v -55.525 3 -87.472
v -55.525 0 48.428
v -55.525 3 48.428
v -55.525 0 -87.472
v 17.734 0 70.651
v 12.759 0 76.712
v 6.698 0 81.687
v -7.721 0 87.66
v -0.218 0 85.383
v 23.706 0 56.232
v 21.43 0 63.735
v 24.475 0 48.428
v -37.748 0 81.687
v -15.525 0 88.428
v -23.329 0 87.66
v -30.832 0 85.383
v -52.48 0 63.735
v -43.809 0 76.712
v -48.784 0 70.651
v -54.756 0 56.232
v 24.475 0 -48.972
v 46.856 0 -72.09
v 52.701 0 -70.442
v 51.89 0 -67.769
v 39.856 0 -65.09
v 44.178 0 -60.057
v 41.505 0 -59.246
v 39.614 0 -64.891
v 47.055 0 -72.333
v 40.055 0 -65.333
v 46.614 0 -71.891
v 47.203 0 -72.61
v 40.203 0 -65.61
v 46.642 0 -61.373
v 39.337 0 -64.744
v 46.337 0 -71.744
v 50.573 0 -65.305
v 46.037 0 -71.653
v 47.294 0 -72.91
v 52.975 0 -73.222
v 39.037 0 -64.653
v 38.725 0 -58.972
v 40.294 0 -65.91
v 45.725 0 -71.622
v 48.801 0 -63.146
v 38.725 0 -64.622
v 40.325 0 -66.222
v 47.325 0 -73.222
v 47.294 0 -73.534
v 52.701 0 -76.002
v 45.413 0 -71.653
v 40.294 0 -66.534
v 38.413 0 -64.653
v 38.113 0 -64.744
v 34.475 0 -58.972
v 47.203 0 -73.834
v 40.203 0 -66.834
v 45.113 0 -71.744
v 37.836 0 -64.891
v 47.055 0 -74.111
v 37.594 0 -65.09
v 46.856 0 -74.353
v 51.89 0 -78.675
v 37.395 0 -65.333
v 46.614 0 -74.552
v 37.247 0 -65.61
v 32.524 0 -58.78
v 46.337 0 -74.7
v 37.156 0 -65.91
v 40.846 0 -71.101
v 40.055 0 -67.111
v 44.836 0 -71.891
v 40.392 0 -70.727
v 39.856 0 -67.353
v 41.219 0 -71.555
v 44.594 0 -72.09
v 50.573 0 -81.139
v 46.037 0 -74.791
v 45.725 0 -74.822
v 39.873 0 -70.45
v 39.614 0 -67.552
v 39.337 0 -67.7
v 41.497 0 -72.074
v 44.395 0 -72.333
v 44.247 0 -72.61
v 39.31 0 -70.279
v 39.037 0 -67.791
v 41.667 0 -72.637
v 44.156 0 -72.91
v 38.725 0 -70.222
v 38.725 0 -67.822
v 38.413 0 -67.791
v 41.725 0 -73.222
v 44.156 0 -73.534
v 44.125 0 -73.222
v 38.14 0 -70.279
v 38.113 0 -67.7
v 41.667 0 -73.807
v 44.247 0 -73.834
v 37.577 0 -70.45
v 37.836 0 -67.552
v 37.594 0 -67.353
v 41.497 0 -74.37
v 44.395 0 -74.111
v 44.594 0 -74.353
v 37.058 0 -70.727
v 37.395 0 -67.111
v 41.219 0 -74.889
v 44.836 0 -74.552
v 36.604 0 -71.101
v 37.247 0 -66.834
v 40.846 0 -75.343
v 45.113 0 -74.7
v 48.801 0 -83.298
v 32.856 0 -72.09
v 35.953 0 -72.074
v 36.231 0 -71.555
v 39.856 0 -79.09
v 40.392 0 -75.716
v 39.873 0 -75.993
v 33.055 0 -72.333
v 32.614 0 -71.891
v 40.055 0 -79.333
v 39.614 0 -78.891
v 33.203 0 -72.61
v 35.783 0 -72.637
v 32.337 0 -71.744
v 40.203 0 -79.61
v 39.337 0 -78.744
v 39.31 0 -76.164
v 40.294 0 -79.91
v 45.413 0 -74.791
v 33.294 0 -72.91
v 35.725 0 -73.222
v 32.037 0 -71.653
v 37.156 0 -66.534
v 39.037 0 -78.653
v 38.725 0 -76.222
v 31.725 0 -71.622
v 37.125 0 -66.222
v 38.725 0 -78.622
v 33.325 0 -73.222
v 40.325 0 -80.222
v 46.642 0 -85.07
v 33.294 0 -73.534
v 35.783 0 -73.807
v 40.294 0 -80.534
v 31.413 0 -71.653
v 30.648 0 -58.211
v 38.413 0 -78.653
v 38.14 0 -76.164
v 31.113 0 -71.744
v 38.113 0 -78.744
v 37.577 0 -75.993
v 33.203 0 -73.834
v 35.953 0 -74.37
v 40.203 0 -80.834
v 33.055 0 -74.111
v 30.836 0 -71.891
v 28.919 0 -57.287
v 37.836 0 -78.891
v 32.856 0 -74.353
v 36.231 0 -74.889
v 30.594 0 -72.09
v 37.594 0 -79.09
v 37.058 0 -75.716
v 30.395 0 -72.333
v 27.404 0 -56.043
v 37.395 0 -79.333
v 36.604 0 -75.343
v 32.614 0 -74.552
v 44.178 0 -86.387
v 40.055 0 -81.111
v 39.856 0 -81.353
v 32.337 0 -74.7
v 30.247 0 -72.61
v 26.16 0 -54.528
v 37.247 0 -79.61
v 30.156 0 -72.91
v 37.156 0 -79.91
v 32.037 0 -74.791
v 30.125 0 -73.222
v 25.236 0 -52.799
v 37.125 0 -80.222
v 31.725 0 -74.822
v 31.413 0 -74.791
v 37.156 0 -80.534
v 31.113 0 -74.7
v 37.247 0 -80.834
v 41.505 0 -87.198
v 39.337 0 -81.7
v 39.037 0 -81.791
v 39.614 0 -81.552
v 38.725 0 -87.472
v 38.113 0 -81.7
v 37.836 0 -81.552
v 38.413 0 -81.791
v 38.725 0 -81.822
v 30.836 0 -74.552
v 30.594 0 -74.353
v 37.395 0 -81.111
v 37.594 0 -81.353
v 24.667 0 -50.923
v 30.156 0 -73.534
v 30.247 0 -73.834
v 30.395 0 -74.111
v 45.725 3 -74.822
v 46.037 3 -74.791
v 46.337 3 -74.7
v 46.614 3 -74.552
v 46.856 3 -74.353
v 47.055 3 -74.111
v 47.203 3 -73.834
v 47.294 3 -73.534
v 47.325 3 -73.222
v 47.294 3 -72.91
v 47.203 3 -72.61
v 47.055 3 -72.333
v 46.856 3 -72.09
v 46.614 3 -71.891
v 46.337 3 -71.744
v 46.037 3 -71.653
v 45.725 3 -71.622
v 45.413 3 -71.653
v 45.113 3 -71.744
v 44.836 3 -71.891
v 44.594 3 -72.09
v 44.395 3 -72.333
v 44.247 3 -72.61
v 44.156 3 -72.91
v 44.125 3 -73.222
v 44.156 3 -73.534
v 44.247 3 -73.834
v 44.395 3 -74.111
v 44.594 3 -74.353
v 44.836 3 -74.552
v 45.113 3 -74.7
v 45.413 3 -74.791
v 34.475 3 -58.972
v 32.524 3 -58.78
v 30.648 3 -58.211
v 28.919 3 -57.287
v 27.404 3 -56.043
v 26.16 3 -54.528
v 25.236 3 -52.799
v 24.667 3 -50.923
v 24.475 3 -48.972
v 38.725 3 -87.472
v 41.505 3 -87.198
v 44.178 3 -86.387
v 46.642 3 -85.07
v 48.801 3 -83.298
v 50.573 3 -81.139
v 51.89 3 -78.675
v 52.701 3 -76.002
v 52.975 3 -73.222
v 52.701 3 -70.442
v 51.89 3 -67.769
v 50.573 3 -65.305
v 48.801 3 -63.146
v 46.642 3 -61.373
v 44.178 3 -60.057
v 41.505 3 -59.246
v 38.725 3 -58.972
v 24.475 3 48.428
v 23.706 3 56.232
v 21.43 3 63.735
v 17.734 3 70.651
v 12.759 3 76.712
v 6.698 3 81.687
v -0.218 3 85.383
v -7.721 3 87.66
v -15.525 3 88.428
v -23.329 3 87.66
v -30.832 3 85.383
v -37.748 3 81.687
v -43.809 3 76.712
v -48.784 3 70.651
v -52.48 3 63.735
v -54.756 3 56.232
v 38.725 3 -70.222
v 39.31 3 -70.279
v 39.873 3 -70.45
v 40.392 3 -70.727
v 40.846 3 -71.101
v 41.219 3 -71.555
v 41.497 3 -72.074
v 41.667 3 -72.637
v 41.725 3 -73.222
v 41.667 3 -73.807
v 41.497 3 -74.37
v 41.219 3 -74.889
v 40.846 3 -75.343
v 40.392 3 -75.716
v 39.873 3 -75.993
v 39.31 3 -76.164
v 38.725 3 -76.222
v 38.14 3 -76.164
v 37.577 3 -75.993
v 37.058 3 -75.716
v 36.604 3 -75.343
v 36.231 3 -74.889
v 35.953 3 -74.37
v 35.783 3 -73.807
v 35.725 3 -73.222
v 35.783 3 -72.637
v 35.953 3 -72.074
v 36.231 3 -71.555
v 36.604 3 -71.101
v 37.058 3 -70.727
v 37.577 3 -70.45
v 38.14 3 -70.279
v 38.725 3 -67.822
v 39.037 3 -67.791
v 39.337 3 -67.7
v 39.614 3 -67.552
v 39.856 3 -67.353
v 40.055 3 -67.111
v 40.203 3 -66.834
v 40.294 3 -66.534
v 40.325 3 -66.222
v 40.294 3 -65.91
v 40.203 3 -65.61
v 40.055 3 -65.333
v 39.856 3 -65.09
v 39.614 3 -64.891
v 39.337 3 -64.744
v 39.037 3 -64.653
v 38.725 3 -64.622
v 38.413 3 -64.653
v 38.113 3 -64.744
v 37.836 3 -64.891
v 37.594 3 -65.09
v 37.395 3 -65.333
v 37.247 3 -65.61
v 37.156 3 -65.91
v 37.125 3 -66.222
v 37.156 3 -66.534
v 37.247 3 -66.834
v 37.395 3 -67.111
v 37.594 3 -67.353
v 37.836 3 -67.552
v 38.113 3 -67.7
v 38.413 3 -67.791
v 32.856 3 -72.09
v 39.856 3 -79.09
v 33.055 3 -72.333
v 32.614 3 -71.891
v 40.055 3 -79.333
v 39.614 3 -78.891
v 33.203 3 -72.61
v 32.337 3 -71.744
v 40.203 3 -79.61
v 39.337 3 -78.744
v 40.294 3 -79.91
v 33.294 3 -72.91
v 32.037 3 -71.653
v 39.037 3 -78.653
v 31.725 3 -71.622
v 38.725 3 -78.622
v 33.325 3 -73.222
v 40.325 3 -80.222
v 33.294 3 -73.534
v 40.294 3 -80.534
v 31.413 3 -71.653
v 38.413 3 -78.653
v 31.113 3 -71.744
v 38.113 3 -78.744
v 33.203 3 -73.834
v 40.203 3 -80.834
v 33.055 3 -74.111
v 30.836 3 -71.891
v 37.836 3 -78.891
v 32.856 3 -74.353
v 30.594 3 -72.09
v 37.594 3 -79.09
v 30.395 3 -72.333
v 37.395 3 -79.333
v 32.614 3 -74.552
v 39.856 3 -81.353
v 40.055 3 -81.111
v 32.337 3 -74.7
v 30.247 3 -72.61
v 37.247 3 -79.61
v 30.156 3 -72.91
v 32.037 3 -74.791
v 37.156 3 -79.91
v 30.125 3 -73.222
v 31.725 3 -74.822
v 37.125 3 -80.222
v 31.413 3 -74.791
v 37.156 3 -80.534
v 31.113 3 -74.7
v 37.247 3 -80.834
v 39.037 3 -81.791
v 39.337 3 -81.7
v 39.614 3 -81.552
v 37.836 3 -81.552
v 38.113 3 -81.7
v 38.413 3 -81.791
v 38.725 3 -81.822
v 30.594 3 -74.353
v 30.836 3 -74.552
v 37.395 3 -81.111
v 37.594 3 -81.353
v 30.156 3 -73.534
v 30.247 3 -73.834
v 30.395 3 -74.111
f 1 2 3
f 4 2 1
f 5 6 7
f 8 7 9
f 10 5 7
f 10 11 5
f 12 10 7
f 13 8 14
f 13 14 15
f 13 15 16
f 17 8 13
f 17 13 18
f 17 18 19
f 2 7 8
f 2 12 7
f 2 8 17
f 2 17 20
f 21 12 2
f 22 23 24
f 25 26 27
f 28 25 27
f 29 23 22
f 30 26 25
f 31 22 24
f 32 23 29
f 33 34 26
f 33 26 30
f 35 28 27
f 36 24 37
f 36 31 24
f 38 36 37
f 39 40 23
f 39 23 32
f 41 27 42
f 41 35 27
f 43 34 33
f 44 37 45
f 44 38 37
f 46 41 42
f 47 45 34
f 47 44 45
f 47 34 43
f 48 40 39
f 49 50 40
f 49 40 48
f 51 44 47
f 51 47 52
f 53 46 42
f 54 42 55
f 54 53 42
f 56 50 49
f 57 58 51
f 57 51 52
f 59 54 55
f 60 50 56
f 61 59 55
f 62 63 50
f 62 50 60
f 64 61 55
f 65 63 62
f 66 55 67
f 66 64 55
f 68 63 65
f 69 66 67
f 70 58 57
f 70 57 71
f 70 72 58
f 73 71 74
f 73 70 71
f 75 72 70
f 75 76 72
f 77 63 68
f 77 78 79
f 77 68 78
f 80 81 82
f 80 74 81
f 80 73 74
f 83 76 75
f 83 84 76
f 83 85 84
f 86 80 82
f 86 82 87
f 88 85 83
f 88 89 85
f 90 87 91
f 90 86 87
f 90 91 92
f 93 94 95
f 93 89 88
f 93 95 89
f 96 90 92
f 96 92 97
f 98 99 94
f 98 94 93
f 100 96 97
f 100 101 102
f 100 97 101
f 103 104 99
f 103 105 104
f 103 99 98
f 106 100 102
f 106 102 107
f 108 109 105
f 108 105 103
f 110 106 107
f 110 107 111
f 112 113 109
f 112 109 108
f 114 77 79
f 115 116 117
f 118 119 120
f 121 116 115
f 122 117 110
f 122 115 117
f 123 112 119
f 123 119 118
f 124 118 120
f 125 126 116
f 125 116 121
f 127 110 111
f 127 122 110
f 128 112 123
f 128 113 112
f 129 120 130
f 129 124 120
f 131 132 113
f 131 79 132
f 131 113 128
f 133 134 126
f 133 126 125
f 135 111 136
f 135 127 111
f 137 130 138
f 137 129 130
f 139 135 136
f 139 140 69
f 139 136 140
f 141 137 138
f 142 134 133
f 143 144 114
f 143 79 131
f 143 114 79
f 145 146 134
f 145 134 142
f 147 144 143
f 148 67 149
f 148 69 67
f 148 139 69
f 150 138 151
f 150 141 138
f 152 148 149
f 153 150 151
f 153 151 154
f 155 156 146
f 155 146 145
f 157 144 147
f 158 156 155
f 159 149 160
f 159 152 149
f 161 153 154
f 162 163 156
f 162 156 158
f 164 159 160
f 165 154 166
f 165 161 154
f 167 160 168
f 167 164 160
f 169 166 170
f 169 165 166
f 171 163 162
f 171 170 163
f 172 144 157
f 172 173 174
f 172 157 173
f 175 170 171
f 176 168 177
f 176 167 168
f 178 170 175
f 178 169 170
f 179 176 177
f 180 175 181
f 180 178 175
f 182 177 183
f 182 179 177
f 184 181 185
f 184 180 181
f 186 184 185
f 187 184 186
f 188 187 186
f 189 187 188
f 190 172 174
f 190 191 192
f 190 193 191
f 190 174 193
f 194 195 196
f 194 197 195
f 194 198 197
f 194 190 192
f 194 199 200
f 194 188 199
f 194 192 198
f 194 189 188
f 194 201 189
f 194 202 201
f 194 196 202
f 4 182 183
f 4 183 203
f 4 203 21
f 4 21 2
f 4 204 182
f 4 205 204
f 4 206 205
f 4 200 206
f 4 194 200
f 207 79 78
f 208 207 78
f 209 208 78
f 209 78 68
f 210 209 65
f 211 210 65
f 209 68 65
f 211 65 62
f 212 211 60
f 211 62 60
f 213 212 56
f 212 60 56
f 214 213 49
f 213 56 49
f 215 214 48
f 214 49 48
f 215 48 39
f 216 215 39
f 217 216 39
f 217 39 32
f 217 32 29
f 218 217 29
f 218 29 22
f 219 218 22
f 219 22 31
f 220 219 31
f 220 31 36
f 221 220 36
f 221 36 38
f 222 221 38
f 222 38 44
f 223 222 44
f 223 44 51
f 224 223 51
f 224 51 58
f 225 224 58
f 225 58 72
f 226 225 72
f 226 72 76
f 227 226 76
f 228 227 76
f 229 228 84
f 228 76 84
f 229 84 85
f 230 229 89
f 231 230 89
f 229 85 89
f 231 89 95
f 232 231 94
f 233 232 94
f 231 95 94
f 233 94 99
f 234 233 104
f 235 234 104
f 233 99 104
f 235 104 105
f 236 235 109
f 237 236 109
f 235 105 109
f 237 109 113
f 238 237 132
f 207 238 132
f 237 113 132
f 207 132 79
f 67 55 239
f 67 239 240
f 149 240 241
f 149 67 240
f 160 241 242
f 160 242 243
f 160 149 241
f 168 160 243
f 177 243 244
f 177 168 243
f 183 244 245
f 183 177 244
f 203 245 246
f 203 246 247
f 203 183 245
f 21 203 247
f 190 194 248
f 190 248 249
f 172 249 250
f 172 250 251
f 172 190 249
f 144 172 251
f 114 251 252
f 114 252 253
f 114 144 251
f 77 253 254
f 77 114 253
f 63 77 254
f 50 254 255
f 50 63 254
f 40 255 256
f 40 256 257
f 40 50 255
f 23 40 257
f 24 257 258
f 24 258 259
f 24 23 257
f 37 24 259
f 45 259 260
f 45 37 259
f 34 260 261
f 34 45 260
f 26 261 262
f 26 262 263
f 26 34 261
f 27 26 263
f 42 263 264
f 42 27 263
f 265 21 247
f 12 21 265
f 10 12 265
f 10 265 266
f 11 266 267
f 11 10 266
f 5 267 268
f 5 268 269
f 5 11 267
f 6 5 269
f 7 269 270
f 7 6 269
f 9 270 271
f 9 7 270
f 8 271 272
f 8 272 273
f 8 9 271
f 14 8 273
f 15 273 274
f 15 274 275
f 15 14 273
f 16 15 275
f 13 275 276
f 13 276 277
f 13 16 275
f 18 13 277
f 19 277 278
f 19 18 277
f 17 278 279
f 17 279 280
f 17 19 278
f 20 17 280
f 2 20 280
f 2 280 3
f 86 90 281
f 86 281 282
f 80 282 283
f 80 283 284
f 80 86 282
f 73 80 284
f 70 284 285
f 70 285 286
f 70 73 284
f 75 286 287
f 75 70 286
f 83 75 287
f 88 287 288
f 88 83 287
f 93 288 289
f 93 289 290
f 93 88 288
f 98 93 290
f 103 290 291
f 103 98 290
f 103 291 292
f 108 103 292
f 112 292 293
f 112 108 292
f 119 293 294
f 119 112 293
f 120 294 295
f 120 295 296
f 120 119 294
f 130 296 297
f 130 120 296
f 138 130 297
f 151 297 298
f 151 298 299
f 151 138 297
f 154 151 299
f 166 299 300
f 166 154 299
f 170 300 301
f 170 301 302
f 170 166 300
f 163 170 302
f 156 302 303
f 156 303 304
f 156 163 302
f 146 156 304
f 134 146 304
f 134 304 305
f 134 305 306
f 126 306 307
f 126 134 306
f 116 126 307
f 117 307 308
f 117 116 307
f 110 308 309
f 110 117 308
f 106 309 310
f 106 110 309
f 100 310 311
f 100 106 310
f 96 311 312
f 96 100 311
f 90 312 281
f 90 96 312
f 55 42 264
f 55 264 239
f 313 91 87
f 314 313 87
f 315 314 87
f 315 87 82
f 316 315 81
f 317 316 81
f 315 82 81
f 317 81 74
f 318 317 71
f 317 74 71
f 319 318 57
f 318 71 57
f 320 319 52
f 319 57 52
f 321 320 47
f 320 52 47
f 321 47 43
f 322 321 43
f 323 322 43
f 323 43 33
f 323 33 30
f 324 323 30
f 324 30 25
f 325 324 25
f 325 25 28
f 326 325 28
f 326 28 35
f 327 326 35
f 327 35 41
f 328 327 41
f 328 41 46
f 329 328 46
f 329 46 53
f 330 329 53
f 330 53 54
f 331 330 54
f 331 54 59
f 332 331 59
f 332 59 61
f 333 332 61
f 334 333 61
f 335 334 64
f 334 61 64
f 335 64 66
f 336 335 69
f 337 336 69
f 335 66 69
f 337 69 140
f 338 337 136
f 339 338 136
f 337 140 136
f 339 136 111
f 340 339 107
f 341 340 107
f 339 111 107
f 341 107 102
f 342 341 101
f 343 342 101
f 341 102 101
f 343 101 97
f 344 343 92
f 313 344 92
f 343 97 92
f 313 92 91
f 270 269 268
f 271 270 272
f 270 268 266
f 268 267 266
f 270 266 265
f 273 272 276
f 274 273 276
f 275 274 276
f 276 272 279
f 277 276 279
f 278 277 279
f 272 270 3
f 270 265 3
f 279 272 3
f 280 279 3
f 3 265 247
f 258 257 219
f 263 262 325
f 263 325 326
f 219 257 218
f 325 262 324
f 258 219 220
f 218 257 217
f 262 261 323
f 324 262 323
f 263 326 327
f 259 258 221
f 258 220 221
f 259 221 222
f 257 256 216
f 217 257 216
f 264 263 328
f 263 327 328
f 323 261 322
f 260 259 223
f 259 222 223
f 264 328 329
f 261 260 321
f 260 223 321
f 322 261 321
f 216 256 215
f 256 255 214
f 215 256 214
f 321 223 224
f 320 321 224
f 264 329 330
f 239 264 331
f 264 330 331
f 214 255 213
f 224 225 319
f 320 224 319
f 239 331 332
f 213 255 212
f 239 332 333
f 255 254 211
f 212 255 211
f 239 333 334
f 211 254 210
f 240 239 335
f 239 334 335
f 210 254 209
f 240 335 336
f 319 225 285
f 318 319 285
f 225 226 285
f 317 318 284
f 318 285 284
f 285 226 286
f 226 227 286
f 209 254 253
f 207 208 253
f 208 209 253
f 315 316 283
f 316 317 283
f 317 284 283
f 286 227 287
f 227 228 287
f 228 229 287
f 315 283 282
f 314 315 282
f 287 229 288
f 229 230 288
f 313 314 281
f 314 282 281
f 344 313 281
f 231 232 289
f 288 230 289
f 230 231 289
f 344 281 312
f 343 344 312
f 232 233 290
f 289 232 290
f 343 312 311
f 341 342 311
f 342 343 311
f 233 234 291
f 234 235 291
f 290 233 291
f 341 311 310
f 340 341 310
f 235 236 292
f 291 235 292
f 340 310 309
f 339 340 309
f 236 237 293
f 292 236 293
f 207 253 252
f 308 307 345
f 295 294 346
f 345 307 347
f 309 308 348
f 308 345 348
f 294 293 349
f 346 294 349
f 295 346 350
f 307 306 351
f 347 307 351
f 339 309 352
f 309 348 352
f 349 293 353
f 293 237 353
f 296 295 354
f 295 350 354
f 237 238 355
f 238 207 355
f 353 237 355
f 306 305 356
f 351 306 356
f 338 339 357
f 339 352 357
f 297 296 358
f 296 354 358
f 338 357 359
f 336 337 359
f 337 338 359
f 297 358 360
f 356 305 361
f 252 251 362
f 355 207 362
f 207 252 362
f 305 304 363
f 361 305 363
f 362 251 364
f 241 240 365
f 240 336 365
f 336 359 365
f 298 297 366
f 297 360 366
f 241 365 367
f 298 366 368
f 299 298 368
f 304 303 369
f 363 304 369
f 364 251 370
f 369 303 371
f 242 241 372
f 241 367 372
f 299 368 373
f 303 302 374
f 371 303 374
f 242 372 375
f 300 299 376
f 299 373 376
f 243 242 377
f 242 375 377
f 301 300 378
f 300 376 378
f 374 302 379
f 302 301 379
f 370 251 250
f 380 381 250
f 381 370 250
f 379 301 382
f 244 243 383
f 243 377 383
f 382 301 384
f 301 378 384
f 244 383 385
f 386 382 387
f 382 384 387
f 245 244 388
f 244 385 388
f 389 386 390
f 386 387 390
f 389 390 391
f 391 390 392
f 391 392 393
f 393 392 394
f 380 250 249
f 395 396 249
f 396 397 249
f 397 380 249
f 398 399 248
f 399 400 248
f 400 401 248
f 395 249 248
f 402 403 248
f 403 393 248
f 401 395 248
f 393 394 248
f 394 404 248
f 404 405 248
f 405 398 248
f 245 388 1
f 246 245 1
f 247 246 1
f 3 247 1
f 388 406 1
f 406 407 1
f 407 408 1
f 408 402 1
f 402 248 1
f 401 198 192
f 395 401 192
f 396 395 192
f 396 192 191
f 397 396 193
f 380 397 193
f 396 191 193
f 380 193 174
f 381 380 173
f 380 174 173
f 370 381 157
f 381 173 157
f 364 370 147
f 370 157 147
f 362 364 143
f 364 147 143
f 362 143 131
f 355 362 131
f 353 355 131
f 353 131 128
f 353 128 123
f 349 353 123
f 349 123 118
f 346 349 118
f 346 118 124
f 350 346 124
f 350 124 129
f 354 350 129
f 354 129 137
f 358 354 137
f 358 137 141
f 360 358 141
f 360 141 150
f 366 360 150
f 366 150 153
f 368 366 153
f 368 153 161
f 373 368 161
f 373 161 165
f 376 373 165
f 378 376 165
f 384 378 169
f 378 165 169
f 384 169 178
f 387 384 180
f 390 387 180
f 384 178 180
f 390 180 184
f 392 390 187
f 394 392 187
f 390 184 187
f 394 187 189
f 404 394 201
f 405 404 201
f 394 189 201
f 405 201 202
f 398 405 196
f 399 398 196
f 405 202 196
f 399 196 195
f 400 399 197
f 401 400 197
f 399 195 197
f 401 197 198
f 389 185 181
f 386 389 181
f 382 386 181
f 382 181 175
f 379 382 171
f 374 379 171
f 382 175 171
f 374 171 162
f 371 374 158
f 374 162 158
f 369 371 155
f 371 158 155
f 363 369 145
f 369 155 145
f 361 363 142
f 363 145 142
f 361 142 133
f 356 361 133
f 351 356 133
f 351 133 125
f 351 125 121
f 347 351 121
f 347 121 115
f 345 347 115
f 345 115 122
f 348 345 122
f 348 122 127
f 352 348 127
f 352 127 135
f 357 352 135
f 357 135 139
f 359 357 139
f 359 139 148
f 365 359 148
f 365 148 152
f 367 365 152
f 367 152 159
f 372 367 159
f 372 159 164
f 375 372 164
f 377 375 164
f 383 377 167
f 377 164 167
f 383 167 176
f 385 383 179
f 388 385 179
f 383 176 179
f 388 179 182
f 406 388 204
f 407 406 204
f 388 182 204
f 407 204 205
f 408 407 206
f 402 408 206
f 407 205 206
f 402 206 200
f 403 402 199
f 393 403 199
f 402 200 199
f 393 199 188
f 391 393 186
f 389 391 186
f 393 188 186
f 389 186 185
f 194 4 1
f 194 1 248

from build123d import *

# Parameters (mm, degrees)
SKETCH_1_R              = 3
EXTRUDE_1_DEPTH         = 3
HOLE_WIZARD_3_2_3_2_1_D = 3.2


with BuildPart() as part:
    # 草图1 → 凸台-拉伸1 (new body)
    with BuildSketch(Plane(origin=(0, 0, 0), x_dir=(1, 0, 0), z_dir=(0, 1, 0))):
        with BuildLine():
            Line((-55.525082752, -48.428156032), (-55.525082752, 87.471843968))
            Line((-55.525082752, 87.471843968), (38.724917248, 87.471843968))
            ThreePointArc((38.724917248, 87.471843968), (52.974917248, 73.221843968), (38.724917248, 58.971843968))
            Line((38.724917248, 58.971843968), (34.474917248, 58.971843968))
            ThreePointArc((34.474917248, 58.971843968), (27.403849436, 56.04291178), (24.474917248, 48.971843968))
            Line((24.474917248, 48.971843968), (24.474917248, -48.428156032))
            ThreePointArc((24.474917248, -48.428156032), (-15.525082752, -88.428156032), (-55.525082752, -48.428156032))
        make_face()
        with Locations(Location((38.724917248, 73.221843968, 0), (0, 0, 270))):
            Circle(SKETCH_1_R, mode=Mode.SUBTRACT)
    extrude(amount=EXTRUDE_1_DEPTH)

    # Ø3.2 (3.2) 直径孔1 (through all)
    with Locations(Plane(origin=(38.724917248, 3, -80.221843968), x_dir=(0, 0, 1), z_dir=(0, 1, 0))):
        with Locations((0, 0), (7, -7), (14, 0), (7, 7)):
            Hole(HOLE_WIZARD_3_2_3_2_1_D / 2)


solid = part.part
